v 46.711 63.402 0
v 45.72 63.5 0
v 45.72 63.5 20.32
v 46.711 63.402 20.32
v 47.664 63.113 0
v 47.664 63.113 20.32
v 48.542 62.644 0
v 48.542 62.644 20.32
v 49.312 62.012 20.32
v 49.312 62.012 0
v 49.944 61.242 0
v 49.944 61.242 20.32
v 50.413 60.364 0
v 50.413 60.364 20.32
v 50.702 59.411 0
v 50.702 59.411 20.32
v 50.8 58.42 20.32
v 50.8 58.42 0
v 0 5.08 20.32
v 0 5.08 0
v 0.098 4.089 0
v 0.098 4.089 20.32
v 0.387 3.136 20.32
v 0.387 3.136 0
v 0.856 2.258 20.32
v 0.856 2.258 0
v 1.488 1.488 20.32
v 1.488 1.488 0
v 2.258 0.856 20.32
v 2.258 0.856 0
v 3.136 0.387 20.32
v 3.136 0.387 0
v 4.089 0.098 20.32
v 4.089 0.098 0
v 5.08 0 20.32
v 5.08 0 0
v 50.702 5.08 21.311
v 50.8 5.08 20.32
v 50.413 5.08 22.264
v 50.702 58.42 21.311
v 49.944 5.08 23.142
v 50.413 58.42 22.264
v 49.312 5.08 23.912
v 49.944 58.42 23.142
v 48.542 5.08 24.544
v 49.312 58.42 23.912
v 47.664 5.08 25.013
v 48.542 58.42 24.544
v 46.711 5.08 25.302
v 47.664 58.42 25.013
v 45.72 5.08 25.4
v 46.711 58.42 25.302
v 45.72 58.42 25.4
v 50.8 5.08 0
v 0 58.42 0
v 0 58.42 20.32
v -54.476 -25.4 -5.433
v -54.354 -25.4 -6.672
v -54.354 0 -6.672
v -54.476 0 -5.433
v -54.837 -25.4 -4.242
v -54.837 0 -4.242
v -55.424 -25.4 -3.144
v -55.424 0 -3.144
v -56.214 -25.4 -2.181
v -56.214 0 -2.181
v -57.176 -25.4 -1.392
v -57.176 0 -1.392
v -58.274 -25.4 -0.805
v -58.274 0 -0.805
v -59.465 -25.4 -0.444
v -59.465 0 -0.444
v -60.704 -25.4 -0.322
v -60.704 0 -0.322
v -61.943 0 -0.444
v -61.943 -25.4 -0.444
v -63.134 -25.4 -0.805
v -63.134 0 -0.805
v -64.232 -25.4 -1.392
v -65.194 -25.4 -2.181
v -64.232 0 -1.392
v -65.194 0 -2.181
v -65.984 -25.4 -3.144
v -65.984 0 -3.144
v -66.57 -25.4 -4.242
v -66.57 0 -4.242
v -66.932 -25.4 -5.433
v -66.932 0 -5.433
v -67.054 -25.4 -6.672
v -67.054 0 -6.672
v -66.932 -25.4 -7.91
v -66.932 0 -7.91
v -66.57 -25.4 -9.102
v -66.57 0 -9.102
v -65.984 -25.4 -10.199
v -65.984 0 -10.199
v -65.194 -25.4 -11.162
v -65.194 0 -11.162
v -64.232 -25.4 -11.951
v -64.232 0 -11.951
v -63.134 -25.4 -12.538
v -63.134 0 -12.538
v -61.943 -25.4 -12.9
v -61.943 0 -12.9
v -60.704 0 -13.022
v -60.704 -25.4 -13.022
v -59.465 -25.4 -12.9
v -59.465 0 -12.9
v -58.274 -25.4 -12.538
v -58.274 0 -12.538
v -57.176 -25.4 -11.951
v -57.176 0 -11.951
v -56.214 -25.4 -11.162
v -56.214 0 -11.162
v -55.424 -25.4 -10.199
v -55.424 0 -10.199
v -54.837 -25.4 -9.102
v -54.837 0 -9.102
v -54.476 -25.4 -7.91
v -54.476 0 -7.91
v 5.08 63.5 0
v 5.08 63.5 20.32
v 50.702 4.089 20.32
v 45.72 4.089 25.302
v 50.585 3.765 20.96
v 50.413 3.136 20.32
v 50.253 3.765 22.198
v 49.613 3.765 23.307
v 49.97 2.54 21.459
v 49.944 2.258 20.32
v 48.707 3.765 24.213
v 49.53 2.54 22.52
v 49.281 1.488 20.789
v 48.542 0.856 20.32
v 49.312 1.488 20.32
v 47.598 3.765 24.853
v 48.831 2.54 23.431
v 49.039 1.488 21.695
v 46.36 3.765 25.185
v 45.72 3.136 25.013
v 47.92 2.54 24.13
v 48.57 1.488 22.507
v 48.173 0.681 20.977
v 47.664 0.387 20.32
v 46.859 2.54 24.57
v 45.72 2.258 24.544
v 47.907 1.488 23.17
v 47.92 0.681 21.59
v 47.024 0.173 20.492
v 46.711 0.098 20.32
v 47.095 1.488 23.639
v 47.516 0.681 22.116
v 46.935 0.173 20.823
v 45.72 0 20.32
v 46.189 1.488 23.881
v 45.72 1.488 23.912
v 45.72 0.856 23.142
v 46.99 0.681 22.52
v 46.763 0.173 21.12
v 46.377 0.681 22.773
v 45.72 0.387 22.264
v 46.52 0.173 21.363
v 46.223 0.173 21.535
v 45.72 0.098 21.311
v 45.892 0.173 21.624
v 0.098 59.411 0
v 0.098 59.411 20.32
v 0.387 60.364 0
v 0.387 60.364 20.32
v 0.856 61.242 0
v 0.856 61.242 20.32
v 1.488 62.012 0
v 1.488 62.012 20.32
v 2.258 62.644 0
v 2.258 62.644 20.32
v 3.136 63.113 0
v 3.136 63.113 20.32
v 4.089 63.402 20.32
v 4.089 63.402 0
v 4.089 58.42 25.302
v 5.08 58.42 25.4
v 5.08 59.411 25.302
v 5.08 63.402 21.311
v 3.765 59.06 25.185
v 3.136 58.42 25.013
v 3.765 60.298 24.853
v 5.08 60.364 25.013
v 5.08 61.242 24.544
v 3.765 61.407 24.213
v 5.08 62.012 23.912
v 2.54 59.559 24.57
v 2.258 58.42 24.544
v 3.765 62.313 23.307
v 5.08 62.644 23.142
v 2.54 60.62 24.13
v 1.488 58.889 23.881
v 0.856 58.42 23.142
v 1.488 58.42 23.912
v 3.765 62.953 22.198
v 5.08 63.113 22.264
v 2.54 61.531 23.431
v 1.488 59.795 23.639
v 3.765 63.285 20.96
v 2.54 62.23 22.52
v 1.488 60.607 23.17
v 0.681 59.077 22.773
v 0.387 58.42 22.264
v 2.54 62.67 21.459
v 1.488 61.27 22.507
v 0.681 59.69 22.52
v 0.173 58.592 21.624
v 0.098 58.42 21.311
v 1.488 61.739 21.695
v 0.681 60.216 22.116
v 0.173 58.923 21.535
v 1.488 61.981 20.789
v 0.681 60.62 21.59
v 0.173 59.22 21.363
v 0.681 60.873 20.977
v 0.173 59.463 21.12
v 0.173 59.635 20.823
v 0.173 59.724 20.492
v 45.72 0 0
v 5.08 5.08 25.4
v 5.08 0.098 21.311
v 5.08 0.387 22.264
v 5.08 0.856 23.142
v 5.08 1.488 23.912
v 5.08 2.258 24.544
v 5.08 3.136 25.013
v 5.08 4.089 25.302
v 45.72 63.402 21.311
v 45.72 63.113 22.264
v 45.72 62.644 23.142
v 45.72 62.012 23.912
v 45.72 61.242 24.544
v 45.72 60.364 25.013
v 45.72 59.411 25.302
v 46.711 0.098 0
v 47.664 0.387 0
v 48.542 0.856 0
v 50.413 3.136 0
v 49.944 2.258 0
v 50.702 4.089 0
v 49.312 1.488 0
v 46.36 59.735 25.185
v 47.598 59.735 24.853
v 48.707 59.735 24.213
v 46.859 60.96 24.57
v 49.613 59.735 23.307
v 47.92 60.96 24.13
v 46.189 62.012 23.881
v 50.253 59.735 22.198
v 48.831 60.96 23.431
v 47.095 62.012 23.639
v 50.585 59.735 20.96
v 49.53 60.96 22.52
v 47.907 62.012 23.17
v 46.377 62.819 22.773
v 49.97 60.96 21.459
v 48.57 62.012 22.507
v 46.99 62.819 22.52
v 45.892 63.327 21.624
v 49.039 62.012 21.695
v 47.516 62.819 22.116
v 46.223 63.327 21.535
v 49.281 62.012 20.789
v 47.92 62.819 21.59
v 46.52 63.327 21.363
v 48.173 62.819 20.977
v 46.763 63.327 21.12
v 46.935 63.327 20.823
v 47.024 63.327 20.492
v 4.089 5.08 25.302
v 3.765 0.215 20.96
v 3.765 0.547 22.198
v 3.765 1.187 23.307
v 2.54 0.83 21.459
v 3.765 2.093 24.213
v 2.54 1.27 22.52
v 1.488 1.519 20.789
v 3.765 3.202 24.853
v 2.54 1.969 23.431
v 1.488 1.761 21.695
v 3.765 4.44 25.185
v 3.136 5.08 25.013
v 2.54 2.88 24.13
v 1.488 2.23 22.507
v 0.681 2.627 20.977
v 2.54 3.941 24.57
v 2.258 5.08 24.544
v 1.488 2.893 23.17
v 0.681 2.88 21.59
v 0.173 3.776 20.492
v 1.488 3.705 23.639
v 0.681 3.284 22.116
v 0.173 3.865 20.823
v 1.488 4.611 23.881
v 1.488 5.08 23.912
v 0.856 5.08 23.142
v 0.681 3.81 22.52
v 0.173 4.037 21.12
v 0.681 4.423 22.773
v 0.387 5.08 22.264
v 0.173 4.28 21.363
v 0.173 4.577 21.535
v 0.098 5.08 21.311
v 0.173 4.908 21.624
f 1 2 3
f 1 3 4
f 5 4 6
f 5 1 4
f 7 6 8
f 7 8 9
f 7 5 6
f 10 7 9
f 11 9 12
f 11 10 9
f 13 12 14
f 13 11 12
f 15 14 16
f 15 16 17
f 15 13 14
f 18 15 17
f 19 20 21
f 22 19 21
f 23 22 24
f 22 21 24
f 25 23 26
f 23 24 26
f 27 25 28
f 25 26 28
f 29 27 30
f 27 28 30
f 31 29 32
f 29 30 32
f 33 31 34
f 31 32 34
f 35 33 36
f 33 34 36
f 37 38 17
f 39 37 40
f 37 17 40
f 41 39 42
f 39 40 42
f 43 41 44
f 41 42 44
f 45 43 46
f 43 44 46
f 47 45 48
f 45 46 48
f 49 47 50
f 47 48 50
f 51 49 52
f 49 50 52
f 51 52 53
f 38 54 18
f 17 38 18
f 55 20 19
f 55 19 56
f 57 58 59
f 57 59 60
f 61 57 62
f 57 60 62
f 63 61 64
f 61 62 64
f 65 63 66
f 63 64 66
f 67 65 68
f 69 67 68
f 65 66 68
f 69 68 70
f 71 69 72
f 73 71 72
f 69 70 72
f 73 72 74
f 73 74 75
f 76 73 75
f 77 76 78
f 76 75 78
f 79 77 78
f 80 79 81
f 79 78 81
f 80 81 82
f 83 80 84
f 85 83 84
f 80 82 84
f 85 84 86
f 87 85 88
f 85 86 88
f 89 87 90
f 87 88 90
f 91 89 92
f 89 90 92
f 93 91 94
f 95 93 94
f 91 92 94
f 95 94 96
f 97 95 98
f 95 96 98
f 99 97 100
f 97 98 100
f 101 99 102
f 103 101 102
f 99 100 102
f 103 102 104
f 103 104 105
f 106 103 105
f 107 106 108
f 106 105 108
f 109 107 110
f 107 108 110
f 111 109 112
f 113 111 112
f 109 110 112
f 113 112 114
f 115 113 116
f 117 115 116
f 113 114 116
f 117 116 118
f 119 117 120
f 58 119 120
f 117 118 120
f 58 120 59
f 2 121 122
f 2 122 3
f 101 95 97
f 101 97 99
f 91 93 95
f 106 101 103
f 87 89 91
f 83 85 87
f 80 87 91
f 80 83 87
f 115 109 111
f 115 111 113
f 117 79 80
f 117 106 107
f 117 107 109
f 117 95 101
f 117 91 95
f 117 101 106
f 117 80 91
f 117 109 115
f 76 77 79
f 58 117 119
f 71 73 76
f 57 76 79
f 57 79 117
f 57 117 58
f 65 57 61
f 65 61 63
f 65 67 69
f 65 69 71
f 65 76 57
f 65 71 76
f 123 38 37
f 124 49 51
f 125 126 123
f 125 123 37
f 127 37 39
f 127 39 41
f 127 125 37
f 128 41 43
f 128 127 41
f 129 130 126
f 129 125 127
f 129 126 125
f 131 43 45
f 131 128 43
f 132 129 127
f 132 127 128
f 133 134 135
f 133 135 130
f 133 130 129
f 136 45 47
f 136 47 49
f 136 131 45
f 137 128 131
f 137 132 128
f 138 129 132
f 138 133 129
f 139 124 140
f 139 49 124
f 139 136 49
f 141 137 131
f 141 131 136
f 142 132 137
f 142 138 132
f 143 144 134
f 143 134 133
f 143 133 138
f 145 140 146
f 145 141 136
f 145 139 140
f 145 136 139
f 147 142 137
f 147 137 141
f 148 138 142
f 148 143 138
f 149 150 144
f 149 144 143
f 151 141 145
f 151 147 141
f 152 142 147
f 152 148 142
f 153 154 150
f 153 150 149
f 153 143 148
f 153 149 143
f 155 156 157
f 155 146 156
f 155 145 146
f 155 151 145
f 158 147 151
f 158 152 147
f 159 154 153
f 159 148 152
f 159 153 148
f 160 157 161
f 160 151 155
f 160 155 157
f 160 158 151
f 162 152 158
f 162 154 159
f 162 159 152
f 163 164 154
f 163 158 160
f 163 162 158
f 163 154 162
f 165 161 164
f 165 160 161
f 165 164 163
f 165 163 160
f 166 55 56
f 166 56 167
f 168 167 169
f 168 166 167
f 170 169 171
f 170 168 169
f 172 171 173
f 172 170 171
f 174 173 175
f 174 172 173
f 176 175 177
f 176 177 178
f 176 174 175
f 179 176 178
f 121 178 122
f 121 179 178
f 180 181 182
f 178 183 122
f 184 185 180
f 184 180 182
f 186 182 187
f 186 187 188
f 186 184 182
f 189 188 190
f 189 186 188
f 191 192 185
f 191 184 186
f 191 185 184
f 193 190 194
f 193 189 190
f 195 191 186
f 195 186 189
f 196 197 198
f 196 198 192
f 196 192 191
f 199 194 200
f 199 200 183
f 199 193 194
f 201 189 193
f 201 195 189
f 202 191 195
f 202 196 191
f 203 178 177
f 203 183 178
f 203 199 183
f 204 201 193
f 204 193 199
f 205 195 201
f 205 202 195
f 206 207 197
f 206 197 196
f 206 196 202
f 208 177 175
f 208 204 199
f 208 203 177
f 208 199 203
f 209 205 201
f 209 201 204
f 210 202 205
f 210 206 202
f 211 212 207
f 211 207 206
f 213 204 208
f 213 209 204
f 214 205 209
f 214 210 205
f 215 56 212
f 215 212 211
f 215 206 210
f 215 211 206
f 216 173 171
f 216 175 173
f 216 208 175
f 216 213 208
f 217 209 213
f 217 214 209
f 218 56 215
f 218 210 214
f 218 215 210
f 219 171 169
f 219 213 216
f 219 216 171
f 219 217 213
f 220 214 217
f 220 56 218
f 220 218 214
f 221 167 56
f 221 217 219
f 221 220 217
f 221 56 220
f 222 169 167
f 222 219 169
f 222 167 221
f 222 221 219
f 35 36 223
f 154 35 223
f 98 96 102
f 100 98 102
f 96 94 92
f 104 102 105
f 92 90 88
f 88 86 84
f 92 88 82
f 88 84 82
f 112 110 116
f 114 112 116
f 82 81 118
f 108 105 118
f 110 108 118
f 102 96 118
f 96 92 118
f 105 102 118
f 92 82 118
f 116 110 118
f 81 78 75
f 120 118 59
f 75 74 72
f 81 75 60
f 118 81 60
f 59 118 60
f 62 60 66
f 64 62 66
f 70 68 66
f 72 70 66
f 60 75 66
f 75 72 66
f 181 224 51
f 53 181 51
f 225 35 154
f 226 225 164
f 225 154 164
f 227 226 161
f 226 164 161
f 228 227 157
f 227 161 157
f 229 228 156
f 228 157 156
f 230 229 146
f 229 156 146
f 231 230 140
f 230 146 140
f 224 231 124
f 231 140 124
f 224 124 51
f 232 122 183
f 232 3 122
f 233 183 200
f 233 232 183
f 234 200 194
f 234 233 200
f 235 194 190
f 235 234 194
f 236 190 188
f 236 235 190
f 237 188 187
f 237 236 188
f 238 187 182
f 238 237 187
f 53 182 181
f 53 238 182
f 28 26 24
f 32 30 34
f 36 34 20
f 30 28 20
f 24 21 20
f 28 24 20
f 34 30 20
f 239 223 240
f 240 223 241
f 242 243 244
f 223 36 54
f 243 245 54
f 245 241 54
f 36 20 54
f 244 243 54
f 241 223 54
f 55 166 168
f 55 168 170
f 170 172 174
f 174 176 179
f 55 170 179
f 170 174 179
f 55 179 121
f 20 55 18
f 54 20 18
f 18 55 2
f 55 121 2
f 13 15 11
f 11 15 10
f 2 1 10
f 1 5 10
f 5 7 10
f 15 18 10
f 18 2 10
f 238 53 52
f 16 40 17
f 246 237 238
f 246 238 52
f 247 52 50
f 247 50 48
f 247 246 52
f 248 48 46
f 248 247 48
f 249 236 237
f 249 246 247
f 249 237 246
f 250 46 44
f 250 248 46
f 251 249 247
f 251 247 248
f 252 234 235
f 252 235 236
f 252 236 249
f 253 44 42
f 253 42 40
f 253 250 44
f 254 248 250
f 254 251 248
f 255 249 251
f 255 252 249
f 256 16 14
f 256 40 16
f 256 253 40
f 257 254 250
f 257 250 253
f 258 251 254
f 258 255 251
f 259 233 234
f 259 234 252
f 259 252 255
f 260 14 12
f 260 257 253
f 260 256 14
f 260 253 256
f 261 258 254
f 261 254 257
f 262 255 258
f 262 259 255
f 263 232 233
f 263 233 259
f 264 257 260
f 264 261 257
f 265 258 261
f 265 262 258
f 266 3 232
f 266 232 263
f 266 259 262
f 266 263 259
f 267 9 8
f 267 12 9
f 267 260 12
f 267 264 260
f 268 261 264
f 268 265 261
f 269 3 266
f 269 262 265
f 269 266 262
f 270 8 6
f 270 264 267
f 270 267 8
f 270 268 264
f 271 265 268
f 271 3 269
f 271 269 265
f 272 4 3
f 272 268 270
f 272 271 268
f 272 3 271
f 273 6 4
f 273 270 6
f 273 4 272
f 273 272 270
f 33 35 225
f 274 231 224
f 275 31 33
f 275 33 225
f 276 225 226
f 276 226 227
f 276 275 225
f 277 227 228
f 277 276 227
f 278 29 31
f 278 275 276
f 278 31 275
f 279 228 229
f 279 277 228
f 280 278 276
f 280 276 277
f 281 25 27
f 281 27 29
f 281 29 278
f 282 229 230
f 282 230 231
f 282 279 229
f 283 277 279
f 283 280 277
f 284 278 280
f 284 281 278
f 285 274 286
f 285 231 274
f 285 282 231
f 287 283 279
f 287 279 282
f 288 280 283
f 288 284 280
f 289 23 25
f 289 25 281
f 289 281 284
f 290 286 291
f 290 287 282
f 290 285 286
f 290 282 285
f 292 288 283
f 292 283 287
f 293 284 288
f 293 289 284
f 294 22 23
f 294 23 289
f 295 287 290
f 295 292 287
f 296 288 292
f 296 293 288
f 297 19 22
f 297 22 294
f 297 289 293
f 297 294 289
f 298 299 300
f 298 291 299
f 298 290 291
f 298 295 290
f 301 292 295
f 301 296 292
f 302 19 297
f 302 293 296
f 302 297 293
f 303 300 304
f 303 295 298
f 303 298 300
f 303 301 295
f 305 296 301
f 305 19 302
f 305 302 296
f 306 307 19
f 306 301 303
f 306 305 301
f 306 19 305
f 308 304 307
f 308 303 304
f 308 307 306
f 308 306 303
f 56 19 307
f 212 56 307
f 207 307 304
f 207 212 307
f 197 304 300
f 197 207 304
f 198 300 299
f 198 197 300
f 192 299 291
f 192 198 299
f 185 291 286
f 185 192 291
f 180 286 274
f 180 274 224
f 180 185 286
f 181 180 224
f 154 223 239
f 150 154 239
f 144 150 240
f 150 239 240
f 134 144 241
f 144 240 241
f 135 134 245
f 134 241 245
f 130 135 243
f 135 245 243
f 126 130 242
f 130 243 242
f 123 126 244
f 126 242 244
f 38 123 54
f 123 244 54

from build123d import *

# Parameters (mm, degrees)
F0_W         = 50.8
F0_H         = 63.5
F1_DEPTH     = 25.4
F2_R         = 6.35
F3_DEPTH     = 25.4
F4_R         = 5.08
F5_T1_DEPTH  = 33.02
F5_S5_W      = 5.08
F5_S5_H      = 5.08
F5_T6_DEPTH  = 5.08
F5_S11_W     = 5.08
F5_S11_H     = 5.08
F5_T12_DEPTH = 5.08
F5_S17_W     = 5.08
F5_S17_H     = 5.08
F5_T18_DEPTH = 5.08
F5_S23_W     = 5.08
F5_S23_H     = 5.08
F5_T24_DEPTH = 5.08


# Not quite as in the source:
# - a fillet or chamfer that OpenCascade refuses, or shapes differently, is made with other operations: its cross-section is extruded or revolved along the edge and cut away or added


with BuildPart() as f1:
    # F0 (on Top) → F1 (new body)
    with BuildSketch(Plane.XY):
        with Locations((25.4, 31.75)):
            Rectangle(F0_W, F0_H)
    extrude(amount=F1_DEPTH)

    # F4
    f4_edges = [f1.edges().sort_by_distance(p)[0] for p in [
        (25.4, 0, 25.4),
        (50.8, 31.75, 25.4),
        (25.4, 63.5, 25.4),
        (0, 31.75, 25.4),
    ]]
    fillet(f4_edges, radius=F4_R)

    # F5: fillet of radius 5.08 on 4 edges, made by hand

    # F5_s2 → F5_t1 (cut)
    with BuildSketch(Plane.XY.offset(-12.7)):
        with BuildLine():
            ThreePointArc((0, 5.08), (1.4878975516, 1.4878975516), (5.08, 0))
            Line((5.08, 0), (0, 0))
            Line((0, 0), (0, 5.08))
        make_face()
        with BuildLine():
            ThreePointArc((45.72, 0), (49.3121024484, 1.4878975516), (50.8, 5.08))
            Line((50.8, 5.08), (50.8, 0))
            Line((50.8, 0), (45.72, 0))
        make_face()
        with BuildLine():
            ThreePointArc((45.72, 63.5), (49.3121024484, 62.0121024484), (50.8, 58.42))
            Line((50.8, 58.42), (50.8, 63.5))
            Line((50.8, 63.5), (45.72, 63.5))
        make_face()
        with BuildLine():
            ThreePointArc((0, 58.42), (1.4878975516, 62.0121024484), (5.08, 63.5))
            Line((5.08, 63.5), (0, 63.5))
            Line((0, 63.5), (0, 58.42))
        make_face()
    extrude(amount=F5_T1_DEPTH, mode=Mode.SUBTRACT)


with BuildPart() as f3:
    # F2 (on Front) → F3 (new body)
    with BuildSketch(Plane.XZ):
        with Locations((-60.7038587332, -6.6716084257)):
            Circle(F2_R)
    extrude(amount=F3_DEPTH)


with BuildPart() as f5_tool4:
    # F5_s5 → F5_t6 (new body)
    with BuildSketch(Plane.YZ.offset(5.08)):
        with Locations((60.96, 22.86)):
            Rectangle(F5_S5_W, F5_S5_H)
    extrude(amount=-F5_T6_DEPTH)

    # F5_s7 → F5_t8 (revolve, cut)
    with BuildSketch(Plane(origin=(5.08, 58.42, 20.32), x_dir=(0, -0.7071067812, -0.7071067812), z_dir=(0, 0.7071067812, -0.7071067812))):
        with BuildLine():
            ThreePointArc((0, -5.08), (5.08, 0), (0, 5.08))
            Line((0, 5.08), (0, -5.08))
        make_face()
    revolve(axis=Axis((5.08, 58.42, 20.32), (-1, 0, 0)), mode=Mode.SUBTRACT)


with BuildPart() as f1_1:
    add(f1.part)

    # F5_t3: cut F5_tool4
    add(f5_tool4.part, mode=Mode.SUBTRACT)


with BuildPart() as f5_tool10:
    # F5_s11 → F5_t12 (new body)
    with BuildSketch(Plane.XZ.offset(-58.42)):
        with Locations((48.26, 22.86)):
            Rectangle(F5_S11_W, F5_S11_H)
    extrude(amount=-F5_T12_DEPTH)

    # F5_s13 → F5_t14 (revolve, cut)
    with BuildSketch(Plane(origin=(45.72, 58.42, 20.32), x_dir=(-0.7071067812, 0, -0.7071067812), z_dir=(0.7071067812, 0, -0.7071067812))):
        with BuildLine():
            ThreePointArc((0, -5.08), (5.08, 0), (0, 5.08))
            Line((0, 5.08), (0, -5.08))
        make_face()
    revolve(axis=Axis((45.72, 58.42, 20.32), (0, 1, 0)), mode=Mode.SUBTRACT)


with BuildPart() as f1_2:
    add(f1_1.part)

    # F5_t9: cut F5_tool10
    add(f5_tool10.part, mode=Mode.SUBTRACT)


with BuildPart() as f5_tool16:
    # F5_s17 → F5_t18 (new body)
    with BuildSketch(Plane.XZ.offset(-5.08)):
        with Locations((48.26, 22.86)):
            Rectangle(F5_S17_W, F5_S17_H)
    extrude(amount=F5_T18_DEPTH)

    # F5_s19 → F5_t20 (revolve, cut)
    with BuildSketch(Plane(origin=(45.72, 5.08, 20.32), x_dir=(-0.7071067812, 0, -0.7071067812), z_dir=(-0.7071067812, 0, 0.7071067812))):
        with BuildLine():
            ThreePointArc((0, -5.08), (5.08, 0), (0, 5.08))
            Line((0, 5.08), (0, -5.08))
        make_face()
    revolve(axis=Axis((45.72, 5.08, 20.32), (0, -1, 0)), mode=Mode.SUBTRACT)


with BuildPart() as f1_3:
    add(f1_2.part)

    # F5_t15: cut F5_tool16
    add(f5_tool16.part, mode=Mode.SUBTRACT)


with BuildPart() as f5_tool22:
    # F5_s23 → F5_t24 (new body)
    with BuildSketch(Plane.YZ.offset(5.08)):
        with Locations((2.54, 22.86)):
            Rectangle(F5_S23_W, F5_S23_H)
    extrude(amount=-F5_T24_DEPTH)

    # F5_s25 → F5_t26 (revolve, cut)
    with BuildSketch(Plane(origin=(5.08, 5.08, 20.32), x_dir=(0, 0.7071067812, -0.7071067812), z_dir=(0, 0.7071067812, 0.7071067812))):
        with BuildLine():
            ThreePointArc((0, -5.08), (5.08, 0), (0, 5.08))
            Line((0, 5.08), (0, -5.08))
        make_face()
    revolve(axis=Axis((5.08, 5.08, 20.32), (-1, 0, 0)), mode=Mode.SUBTRACT)


with BuildPart() as f1_4:
    add(f1_3.part)

    # F5_t21: cut F5_tool22
    add(f5_tool22.part, mode=Mode.SUBTRACT)


solid = Compound([f3.part, f1_4.part])
